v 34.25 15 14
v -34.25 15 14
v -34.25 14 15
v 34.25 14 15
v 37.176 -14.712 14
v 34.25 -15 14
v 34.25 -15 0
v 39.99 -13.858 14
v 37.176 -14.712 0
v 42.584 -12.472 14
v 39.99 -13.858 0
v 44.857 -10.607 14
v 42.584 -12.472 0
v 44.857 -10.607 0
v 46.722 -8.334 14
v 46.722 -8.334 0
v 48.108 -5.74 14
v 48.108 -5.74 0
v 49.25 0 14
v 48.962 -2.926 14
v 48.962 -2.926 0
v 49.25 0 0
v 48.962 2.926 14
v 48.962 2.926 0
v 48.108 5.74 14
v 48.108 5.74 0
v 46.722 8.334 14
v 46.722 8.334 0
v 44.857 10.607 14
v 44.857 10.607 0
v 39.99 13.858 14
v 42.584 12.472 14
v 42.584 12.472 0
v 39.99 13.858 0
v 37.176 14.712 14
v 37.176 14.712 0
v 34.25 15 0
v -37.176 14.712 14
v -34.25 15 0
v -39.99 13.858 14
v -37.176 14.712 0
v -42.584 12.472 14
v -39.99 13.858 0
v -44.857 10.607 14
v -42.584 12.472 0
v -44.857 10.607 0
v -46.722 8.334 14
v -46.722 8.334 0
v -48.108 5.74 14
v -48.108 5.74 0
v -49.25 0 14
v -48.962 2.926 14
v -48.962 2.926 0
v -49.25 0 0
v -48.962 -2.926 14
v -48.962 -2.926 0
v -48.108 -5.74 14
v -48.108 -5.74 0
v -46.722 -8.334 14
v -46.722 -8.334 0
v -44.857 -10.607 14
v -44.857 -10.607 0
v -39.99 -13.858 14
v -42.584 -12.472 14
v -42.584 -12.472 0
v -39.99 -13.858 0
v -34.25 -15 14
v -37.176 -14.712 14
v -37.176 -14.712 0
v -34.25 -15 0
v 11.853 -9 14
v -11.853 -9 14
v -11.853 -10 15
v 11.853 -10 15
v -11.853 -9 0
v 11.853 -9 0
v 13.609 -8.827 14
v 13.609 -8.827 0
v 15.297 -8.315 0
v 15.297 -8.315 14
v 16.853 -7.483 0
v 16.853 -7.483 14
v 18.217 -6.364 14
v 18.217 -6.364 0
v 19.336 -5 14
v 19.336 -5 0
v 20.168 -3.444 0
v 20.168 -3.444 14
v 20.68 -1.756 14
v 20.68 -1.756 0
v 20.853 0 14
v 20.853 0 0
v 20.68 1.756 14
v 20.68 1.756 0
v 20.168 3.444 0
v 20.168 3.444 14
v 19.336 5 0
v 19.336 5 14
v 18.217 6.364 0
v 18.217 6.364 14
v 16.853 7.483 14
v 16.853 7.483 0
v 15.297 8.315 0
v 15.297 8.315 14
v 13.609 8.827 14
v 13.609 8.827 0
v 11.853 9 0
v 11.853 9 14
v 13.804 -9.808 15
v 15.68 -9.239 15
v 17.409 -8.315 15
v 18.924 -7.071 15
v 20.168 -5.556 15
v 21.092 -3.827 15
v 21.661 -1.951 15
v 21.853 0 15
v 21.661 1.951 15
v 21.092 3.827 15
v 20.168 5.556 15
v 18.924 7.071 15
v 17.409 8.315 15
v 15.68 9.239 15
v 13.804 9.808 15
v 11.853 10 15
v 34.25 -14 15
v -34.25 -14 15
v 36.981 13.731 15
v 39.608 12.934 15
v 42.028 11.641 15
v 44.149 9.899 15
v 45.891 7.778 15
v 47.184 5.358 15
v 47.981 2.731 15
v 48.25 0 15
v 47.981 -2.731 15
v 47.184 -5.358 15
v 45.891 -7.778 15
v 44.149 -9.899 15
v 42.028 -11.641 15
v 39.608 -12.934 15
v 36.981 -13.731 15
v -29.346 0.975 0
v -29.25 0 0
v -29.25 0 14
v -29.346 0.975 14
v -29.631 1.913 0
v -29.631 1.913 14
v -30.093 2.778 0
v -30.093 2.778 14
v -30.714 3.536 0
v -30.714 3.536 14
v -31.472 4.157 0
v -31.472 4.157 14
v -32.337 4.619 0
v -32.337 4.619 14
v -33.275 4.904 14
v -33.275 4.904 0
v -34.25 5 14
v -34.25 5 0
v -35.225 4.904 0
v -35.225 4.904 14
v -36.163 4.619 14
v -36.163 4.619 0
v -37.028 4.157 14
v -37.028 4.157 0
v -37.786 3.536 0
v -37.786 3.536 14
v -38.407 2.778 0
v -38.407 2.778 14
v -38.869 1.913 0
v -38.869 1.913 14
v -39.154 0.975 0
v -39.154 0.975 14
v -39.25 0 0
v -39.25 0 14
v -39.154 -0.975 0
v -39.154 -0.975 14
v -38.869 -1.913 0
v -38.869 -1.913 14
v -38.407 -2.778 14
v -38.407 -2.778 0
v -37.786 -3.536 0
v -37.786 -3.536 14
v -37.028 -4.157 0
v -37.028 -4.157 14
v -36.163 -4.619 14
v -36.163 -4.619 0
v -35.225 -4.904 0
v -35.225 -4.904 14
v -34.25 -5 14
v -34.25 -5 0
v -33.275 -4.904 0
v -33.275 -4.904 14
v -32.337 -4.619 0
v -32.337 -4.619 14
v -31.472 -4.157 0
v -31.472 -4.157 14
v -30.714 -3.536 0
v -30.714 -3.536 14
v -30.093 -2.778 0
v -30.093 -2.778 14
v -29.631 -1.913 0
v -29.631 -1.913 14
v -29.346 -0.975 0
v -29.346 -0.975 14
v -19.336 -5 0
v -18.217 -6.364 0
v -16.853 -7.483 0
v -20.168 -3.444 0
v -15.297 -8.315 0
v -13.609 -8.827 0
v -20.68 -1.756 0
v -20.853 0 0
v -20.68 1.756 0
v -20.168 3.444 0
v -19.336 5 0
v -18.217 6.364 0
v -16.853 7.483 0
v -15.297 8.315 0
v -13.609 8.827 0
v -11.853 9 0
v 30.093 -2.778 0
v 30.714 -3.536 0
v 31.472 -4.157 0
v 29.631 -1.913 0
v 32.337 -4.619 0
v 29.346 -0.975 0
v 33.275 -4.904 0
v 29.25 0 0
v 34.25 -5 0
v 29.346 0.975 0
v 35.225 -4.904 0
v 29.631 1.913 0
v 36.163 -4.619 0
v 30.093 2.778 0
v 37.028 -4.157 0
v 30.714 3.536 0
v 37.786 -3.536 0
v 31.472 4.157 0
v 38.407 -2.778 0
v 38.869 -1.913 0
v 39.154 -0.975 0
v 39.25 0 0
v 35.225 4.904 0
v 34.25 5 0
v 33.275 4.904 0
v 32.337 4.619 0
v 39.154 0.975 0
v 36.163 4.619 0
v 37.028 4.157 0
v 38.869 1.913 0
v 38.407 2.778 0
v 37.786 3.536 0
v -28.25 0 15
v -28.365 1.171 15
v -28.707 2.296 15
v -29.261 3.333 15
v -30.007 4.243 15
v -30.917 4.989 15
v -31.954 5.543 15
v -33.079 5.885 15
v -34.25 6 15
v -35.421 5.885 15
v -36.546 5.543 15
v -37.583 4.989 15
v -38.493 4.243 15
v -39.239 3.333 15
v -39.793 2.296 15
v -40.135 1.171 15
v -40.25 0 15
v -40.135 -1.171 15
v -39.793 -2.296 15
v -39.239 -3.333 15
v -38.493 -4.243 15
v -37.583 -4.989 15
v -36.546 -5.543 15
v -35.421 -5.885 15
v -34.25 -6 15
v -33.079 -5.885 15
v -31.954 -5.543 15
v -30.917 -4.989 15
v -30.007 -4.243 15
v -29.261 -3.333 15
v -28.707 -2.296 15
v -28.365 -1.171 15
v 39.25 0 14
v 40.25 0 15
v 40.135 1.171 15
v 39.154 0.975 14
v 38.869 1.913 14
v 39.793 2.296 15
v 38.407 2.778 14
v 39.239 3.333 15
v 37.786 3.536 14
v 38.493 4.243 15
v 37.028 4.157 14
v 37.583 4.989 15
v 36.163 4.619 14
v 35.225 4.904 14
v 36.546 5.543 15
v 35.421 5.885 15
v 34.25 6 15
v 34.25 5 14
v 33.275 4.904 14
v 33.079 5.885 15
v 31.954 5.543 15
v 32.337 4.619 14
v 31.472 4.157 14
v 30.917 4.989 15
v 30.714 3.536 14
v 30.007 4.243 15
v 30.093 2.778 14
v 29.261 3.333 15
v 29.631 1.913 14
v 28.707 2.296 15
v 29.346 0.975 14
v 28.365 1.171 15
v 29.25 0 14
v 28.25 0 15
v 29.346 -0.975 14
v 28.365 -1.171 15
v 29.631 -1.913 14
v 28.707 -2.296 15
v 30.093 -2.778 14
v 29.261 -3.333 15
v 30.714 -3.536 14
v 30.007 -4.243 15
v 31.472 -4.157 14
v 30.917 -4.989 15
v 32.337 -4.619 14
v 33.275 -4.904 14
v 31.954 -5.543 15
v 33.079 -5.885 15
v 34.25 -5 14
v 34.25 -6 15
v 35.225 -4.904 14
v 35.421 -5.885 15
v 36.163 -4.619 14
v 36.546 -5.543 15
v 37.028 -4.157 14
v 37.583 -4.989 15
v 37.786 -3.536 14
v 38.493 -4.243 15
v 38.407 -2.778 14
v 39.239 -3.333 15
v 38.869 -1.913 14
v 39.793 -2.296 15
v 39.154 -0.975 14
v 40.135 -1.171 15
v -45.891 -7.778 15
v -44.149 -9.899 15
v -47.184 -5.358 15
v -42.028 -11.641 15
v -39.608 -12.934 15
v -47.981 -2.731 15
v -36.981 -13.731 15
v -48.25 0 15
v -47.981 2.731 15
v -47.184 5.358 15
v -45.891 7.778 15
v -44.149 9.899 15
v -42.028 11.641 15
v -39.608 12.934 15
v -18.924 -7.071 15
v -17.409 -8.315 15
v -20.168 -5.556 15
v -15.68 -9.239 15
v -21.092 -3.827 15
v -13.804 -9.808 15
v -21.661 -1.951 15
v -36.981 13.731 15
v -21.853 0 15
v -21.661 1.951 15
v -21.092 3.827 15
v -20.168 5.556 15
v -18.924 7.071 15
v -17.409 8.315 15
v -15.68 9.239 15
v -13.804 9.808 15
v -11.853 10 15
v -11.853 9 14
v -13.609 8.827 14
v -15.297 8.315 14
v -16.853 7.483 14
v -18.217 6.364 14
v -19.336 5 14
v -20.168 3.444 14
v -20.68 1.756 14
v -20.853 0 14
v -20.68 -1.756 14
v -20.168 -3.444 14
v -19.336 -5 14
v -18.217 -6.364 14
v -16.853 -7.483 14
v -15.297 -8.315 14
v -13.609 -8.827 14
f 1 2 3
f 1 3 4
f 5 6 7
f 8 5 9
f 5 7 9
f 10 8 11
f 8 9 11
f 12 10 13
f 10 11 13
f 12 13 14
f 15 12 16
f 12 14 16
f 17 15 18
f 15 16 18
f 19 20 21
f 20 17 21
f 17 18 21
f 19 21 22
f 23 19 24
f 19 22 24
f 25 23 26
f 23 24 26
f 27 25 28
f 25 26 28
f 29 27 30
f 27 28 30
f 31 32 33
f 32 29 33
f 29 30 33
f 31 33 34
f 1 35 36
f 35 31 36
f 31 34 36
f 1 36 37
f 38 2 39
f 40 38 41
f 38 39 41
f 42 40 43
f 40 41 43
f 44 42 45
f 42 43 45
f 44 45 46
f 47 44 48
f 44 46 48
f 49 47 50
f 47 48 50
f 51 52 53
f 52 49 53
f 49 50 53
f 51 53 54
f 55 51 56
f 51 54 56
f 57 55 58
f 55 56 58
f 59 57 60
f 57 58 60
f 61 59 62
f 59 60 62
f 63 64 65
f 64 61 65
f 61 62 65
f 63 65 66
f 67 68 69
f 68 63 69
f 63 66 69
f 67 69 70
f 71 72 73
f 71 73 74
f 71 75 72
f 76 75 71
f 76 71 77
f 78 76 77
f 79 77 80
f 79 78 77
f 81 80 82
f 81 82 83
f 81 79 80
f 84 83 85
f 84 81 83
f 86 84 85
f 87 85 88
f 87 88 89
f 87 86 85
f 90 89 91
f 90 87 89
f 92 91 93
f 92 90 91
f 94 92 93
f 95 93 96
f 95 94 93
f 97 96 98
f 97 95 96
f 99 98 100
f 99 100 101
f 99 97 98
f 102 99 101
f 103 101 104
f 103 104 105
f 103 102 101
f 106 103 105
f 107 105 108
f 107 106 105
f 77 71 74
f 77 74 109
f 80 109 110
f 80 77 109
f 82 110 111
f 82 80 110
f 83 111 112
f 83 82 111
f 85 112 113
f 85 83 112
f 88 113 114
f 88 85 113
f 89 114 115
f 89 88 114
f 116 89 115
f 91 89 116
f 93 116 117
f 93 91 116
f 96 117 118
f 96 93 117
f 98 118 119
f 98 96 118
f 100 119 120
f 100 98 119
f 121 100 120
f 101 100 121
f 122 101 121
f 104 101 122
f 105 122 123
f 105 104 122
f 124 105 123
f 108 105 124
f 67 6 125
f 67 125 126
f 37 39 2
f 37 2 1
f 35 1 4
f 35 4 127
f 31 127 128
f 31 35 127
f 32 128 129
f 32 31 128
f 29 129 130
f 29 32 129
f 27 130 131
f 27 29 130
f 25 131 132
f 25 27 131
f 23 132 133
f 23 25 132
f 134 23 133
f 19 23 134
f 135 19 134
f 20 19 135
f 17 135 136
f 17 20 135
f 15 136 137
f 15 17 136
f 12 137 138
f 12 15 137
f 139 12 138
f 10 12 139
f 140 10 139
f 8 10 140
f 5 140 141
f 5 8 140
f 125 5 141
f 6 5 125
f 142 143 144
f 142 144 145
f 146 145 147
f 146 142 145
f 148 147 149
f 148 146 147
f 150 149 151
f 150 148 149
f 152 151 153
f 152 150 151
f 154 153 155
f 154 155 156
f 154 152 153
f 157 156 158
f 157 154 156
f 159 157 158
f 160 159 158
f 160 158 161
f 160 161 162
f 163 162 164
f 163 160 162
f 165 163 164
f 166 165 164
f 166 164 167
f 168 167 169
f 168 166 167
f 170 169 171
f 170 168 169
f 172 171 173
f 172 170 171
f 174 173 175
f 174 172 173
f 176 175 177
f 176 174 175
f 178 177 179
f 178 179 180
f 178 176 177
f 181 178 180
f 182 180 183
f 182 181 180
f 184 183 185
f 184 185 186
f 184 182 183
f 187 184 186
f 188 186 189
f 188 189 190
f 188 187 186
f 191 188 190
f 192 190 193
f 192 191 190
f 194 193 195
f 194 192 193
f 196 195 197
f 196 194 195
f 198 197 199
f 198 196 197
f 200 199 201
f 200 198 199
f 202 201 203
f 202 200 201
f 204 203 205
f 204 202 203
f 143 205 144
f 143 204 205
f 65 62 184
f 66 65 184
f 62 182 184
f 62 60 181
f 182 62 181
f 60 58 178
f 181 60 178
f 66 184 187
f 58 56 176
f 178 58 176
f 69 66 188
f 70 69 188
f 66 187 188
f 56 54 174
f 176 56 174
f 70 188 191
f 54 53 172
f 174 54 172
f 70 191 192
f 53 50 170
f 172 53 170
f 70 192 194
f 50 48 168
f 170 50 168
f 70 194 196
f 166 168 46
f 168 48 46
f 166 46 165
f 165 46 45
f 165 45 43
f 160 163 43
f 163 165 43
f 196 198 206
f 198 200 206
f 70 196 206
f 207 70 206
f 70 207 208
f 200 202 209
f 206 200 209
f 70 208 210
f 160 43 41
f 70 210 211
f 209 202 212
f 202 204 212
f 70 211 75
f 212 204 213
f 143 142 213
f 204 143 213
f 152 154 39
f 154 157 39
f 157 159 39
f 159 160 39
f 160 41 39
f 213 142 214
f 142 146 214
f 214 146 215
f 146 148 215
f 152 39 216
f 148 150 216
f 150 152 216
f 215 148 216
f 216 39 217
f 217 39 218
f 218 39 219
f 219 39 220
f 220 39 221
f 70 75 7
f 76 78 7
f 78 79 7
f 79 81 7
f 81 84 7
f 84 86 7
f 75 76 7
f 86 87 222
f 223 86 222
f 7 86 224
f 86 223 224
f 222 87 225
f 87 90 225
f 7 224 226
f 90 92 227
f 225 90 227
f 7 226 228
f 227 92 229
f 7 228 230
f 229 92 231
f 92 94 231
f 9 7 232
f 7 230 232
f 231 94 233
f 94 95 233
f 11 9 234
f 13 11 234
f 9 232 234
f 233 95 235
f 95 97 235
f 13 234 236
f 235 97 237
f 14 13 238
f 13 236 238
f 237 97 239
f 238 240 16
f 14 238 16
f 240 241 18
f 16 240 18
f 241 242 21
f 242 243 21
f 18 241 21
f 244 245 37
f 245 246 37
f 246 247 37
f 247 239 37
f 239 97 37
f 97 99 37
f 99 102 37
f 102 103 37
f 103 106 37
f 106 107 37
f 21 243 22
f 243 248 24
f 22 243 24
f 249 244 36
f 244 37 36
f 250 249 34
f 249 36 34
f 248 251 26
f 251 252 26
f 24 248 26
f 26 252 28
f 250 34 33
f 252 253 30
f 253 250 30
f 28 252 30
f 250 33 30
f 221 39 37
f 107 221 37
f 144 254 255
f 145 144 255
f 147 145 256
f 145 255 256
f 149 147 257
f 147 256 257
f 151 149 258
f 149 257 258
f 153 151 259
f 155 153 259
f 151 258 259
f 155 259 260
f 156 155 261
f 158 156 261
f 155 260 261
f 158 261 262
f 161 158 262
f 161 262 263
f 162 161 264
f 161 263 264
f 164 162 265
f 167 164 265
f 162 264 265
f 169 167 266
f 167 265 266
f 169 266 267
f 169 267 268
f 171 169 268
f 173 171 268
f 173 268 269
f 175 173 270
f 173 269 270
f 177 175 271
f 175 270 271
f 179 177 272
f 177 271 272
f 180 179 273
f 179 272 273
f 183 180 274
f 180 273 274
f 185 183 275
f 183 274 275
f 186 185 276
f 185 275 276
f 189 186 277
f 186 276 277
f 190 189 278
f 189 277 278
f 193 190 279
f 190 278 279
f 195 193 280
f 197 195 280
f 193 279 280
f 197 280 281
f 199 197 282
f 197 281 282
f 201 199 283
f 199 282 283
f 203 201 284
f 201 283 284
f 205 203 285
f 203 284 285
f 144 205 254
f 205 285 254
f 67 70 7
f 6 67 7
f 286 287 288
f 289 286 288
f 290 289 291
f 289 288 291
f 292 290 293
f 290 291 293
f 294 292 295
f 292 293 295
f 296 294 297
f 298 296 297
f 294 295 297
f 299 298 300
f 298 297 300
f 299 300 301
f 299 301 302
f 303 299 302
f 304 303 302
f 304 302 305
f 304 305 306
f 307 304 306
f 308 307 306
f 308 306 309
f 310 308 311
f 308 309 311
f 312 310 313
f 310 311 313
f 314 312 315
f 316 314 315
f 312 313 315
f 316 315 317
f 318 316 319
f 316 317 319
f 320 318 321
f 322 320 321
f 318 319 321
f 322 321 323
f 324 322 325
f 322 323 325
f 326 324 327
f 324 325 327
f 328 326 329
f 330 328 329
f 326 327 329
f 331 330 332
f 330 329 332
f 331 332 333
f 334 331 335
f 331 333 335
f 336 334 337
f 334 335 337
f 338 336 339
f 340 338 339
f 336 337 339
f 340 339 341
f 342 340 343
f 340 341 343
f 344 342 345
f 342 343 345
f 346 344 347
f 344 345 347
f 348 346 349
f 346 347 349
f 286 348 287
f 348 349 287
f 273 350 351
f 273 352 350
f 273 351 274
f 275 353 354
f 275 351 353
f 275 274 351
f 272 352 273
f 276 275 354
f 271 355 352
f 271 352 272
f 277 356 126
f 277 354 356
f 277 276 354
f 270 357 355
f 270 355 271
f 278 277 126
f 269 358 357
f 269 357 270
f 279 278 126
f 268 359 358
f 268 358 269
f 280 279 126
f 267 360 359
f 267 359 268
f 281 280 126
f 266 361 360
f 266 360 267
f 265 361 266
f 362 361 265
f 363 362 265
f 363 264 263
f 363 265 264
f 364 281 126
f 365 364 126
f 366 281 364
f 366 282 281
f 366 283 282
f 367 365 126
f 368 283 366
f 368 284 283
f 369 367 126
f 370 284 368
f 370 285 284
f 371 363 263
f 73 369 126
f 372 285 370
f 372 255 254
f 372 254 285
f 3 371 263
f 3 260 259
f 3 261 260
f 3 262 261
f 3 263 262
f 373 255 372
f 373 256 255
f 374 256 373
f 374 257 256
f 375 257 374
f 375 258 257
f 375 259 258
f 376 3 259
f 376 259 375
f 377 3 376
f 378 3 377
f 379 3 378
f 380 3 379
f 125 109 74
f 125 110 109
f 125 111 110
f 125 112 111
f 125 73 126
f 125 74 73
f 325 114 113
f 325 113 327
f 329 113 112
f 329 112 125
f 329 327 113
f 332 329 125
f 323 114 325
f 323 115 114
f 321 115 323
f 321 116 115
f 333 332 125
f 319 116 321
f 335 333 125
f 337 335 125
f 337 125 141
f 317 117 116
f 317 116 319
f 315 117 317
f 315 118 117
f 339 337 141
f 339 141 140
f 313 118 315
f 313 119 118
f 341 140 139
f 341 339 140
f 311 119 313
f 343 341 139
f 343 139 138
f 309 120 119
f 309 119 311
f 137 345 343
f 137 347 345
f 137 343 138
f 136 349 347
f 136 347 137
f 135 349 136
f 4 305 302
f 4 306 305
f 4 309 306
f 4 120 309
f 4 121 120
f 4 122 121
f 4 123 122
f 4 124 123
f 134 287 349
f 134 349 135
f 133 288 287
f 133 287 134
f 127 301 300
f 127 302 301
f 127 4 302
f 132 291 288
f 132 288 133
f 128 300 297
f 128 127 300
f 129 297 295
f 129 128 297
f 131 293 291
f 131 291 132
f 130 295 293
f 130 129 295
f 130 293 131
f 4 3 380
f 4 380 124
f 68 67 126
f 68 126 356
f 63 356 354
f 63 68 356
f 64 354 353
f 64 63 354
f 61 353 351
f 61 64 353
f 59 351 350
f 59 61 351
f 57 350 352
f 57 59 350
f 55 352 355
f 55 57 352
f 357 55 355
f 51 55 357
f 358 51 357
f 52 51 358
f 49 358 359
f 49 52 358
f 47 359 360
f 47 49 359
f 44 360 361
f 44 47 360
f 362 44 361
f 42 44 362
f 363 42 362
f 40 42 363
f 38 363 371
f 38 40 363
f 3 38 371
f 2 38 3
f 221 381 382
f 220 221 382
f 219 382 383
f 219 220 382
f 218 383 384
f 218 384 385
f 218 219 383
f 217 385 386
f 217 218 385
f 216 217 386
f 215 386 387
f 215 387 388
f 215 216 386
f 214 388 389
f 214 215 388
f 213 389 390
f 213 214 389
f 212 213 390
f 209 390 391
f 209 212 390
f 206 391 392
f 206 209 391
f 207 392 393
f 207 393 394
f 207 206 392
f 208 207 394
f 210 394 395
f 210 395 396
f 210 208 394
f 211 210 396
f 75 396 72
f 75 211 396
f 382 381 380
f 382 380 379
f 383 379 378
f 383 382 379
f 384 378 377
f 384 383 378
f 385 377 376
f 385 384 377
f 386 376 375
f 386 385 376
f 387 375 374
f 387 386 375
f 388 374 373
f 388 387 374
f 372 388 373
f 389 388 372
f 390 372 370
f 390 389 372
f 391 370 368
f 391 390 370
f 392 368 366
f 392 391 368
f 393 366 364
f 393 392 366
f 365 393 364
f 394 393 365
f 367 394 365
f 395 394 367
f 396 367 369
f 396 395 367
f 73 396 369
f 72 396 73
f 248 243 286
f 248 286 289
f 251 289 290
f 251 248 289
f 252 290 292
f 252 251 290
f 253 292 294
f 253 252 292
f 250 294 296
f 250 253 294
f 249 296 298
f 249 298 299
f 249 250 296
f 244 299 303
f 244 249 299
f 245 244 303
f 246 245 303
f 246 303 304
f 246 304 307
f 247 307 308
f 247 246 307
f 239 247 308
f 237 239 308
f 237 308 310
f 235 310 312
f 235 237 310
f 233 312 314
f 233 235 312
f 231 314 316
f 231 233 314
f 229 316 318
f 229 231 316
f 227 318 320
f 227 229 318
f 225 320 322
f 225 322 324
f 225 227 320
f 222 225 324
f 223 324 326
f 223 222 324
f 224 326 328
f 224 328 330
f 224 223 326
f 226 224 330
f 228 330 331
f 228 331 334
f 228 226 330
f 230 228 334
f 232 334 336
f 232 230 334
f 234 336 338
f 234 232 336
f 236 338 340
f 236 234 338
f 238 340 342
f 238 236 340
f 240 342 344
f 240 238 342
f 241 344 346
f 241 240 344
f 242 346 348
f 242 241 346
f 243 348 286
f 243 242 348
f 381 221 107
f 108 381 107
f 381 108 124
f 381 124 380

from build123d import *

# Parameters (mm, degrees)
SKETCH_R        = 5
PAD_DEPTH       = 15
CHAMFER_SIZE    = 1
CHAMFER001_SIZE = 1
CHAMFER002_SIZE = 1


with BuildPart() as part:
    # Sketch → Pad (new body)
    with BuildSketch(Plane.XY):
        with BuildLine():
            ThreePointArc((-34.25, 15), (-49.25, 0), (-34.25, -15))
            Line((-34.25, -15), (34.25, -15))
            ThreePointArc((34.25, -15), (49.25, 0), (34.25, 15))
            Line((-34.25, 15), (34.25, 15))
        make_face()
        with Locations((-34.25, 0)):
            Circle(SKETCH_R, mode=Mode.SUBTRACT)
        with Locations((34.25, 0)):
            Circle(SKETCH_R, mode=Mode.SUBTRACT)
        with BuildLine():
            ThreePointArc((-11.85289, 9), (-20.85289, 0), (-11.85289, -9))
            Line((-11.85289, -9), (11.85289, -9))
            ThreePointArc((11.85289, -9), (20.85289, 0), (11.85289, 9))
            Line((-11.85289, 9), (11.85289, 9))
        make_face(mode=Mode.SUBTRACT)
    extrude(amount=PAD_DEPTH)

    # Chamfer
    chamfer_edges = [part.edges().sort_by_distance(p)[0] for p in [
        (-39.25, 0, 15),
        (29.25, 0, 15),
    ]]
    chamfer(chamfer_edges, length=CHAMFER_SIZE)

    # Chamfer001
    chamfer001_edges = [part.edges().sort_by_distance(p)[0] for p in [
        (0, 15, 15),
        (49.25, 0, 15),
        (0, -15, 15),
        (-49.25, 0, 15),
    ]]
    chamfer(chamfer001_edges, length=CHAMFER001_SIZE)

    # Chamfer002
    chamfer002_edges = [part.edges().sort_by_distance(p)[0] for p in [
        (20.85289, 0, 15),
        (0, -9, 15),
        (-20.85289, 0, 15),
        (0, 9, 15),
    ]]
    chamfer(chamfer002_edges, length=CHAMFER002_SIZE)


solid = part.part
